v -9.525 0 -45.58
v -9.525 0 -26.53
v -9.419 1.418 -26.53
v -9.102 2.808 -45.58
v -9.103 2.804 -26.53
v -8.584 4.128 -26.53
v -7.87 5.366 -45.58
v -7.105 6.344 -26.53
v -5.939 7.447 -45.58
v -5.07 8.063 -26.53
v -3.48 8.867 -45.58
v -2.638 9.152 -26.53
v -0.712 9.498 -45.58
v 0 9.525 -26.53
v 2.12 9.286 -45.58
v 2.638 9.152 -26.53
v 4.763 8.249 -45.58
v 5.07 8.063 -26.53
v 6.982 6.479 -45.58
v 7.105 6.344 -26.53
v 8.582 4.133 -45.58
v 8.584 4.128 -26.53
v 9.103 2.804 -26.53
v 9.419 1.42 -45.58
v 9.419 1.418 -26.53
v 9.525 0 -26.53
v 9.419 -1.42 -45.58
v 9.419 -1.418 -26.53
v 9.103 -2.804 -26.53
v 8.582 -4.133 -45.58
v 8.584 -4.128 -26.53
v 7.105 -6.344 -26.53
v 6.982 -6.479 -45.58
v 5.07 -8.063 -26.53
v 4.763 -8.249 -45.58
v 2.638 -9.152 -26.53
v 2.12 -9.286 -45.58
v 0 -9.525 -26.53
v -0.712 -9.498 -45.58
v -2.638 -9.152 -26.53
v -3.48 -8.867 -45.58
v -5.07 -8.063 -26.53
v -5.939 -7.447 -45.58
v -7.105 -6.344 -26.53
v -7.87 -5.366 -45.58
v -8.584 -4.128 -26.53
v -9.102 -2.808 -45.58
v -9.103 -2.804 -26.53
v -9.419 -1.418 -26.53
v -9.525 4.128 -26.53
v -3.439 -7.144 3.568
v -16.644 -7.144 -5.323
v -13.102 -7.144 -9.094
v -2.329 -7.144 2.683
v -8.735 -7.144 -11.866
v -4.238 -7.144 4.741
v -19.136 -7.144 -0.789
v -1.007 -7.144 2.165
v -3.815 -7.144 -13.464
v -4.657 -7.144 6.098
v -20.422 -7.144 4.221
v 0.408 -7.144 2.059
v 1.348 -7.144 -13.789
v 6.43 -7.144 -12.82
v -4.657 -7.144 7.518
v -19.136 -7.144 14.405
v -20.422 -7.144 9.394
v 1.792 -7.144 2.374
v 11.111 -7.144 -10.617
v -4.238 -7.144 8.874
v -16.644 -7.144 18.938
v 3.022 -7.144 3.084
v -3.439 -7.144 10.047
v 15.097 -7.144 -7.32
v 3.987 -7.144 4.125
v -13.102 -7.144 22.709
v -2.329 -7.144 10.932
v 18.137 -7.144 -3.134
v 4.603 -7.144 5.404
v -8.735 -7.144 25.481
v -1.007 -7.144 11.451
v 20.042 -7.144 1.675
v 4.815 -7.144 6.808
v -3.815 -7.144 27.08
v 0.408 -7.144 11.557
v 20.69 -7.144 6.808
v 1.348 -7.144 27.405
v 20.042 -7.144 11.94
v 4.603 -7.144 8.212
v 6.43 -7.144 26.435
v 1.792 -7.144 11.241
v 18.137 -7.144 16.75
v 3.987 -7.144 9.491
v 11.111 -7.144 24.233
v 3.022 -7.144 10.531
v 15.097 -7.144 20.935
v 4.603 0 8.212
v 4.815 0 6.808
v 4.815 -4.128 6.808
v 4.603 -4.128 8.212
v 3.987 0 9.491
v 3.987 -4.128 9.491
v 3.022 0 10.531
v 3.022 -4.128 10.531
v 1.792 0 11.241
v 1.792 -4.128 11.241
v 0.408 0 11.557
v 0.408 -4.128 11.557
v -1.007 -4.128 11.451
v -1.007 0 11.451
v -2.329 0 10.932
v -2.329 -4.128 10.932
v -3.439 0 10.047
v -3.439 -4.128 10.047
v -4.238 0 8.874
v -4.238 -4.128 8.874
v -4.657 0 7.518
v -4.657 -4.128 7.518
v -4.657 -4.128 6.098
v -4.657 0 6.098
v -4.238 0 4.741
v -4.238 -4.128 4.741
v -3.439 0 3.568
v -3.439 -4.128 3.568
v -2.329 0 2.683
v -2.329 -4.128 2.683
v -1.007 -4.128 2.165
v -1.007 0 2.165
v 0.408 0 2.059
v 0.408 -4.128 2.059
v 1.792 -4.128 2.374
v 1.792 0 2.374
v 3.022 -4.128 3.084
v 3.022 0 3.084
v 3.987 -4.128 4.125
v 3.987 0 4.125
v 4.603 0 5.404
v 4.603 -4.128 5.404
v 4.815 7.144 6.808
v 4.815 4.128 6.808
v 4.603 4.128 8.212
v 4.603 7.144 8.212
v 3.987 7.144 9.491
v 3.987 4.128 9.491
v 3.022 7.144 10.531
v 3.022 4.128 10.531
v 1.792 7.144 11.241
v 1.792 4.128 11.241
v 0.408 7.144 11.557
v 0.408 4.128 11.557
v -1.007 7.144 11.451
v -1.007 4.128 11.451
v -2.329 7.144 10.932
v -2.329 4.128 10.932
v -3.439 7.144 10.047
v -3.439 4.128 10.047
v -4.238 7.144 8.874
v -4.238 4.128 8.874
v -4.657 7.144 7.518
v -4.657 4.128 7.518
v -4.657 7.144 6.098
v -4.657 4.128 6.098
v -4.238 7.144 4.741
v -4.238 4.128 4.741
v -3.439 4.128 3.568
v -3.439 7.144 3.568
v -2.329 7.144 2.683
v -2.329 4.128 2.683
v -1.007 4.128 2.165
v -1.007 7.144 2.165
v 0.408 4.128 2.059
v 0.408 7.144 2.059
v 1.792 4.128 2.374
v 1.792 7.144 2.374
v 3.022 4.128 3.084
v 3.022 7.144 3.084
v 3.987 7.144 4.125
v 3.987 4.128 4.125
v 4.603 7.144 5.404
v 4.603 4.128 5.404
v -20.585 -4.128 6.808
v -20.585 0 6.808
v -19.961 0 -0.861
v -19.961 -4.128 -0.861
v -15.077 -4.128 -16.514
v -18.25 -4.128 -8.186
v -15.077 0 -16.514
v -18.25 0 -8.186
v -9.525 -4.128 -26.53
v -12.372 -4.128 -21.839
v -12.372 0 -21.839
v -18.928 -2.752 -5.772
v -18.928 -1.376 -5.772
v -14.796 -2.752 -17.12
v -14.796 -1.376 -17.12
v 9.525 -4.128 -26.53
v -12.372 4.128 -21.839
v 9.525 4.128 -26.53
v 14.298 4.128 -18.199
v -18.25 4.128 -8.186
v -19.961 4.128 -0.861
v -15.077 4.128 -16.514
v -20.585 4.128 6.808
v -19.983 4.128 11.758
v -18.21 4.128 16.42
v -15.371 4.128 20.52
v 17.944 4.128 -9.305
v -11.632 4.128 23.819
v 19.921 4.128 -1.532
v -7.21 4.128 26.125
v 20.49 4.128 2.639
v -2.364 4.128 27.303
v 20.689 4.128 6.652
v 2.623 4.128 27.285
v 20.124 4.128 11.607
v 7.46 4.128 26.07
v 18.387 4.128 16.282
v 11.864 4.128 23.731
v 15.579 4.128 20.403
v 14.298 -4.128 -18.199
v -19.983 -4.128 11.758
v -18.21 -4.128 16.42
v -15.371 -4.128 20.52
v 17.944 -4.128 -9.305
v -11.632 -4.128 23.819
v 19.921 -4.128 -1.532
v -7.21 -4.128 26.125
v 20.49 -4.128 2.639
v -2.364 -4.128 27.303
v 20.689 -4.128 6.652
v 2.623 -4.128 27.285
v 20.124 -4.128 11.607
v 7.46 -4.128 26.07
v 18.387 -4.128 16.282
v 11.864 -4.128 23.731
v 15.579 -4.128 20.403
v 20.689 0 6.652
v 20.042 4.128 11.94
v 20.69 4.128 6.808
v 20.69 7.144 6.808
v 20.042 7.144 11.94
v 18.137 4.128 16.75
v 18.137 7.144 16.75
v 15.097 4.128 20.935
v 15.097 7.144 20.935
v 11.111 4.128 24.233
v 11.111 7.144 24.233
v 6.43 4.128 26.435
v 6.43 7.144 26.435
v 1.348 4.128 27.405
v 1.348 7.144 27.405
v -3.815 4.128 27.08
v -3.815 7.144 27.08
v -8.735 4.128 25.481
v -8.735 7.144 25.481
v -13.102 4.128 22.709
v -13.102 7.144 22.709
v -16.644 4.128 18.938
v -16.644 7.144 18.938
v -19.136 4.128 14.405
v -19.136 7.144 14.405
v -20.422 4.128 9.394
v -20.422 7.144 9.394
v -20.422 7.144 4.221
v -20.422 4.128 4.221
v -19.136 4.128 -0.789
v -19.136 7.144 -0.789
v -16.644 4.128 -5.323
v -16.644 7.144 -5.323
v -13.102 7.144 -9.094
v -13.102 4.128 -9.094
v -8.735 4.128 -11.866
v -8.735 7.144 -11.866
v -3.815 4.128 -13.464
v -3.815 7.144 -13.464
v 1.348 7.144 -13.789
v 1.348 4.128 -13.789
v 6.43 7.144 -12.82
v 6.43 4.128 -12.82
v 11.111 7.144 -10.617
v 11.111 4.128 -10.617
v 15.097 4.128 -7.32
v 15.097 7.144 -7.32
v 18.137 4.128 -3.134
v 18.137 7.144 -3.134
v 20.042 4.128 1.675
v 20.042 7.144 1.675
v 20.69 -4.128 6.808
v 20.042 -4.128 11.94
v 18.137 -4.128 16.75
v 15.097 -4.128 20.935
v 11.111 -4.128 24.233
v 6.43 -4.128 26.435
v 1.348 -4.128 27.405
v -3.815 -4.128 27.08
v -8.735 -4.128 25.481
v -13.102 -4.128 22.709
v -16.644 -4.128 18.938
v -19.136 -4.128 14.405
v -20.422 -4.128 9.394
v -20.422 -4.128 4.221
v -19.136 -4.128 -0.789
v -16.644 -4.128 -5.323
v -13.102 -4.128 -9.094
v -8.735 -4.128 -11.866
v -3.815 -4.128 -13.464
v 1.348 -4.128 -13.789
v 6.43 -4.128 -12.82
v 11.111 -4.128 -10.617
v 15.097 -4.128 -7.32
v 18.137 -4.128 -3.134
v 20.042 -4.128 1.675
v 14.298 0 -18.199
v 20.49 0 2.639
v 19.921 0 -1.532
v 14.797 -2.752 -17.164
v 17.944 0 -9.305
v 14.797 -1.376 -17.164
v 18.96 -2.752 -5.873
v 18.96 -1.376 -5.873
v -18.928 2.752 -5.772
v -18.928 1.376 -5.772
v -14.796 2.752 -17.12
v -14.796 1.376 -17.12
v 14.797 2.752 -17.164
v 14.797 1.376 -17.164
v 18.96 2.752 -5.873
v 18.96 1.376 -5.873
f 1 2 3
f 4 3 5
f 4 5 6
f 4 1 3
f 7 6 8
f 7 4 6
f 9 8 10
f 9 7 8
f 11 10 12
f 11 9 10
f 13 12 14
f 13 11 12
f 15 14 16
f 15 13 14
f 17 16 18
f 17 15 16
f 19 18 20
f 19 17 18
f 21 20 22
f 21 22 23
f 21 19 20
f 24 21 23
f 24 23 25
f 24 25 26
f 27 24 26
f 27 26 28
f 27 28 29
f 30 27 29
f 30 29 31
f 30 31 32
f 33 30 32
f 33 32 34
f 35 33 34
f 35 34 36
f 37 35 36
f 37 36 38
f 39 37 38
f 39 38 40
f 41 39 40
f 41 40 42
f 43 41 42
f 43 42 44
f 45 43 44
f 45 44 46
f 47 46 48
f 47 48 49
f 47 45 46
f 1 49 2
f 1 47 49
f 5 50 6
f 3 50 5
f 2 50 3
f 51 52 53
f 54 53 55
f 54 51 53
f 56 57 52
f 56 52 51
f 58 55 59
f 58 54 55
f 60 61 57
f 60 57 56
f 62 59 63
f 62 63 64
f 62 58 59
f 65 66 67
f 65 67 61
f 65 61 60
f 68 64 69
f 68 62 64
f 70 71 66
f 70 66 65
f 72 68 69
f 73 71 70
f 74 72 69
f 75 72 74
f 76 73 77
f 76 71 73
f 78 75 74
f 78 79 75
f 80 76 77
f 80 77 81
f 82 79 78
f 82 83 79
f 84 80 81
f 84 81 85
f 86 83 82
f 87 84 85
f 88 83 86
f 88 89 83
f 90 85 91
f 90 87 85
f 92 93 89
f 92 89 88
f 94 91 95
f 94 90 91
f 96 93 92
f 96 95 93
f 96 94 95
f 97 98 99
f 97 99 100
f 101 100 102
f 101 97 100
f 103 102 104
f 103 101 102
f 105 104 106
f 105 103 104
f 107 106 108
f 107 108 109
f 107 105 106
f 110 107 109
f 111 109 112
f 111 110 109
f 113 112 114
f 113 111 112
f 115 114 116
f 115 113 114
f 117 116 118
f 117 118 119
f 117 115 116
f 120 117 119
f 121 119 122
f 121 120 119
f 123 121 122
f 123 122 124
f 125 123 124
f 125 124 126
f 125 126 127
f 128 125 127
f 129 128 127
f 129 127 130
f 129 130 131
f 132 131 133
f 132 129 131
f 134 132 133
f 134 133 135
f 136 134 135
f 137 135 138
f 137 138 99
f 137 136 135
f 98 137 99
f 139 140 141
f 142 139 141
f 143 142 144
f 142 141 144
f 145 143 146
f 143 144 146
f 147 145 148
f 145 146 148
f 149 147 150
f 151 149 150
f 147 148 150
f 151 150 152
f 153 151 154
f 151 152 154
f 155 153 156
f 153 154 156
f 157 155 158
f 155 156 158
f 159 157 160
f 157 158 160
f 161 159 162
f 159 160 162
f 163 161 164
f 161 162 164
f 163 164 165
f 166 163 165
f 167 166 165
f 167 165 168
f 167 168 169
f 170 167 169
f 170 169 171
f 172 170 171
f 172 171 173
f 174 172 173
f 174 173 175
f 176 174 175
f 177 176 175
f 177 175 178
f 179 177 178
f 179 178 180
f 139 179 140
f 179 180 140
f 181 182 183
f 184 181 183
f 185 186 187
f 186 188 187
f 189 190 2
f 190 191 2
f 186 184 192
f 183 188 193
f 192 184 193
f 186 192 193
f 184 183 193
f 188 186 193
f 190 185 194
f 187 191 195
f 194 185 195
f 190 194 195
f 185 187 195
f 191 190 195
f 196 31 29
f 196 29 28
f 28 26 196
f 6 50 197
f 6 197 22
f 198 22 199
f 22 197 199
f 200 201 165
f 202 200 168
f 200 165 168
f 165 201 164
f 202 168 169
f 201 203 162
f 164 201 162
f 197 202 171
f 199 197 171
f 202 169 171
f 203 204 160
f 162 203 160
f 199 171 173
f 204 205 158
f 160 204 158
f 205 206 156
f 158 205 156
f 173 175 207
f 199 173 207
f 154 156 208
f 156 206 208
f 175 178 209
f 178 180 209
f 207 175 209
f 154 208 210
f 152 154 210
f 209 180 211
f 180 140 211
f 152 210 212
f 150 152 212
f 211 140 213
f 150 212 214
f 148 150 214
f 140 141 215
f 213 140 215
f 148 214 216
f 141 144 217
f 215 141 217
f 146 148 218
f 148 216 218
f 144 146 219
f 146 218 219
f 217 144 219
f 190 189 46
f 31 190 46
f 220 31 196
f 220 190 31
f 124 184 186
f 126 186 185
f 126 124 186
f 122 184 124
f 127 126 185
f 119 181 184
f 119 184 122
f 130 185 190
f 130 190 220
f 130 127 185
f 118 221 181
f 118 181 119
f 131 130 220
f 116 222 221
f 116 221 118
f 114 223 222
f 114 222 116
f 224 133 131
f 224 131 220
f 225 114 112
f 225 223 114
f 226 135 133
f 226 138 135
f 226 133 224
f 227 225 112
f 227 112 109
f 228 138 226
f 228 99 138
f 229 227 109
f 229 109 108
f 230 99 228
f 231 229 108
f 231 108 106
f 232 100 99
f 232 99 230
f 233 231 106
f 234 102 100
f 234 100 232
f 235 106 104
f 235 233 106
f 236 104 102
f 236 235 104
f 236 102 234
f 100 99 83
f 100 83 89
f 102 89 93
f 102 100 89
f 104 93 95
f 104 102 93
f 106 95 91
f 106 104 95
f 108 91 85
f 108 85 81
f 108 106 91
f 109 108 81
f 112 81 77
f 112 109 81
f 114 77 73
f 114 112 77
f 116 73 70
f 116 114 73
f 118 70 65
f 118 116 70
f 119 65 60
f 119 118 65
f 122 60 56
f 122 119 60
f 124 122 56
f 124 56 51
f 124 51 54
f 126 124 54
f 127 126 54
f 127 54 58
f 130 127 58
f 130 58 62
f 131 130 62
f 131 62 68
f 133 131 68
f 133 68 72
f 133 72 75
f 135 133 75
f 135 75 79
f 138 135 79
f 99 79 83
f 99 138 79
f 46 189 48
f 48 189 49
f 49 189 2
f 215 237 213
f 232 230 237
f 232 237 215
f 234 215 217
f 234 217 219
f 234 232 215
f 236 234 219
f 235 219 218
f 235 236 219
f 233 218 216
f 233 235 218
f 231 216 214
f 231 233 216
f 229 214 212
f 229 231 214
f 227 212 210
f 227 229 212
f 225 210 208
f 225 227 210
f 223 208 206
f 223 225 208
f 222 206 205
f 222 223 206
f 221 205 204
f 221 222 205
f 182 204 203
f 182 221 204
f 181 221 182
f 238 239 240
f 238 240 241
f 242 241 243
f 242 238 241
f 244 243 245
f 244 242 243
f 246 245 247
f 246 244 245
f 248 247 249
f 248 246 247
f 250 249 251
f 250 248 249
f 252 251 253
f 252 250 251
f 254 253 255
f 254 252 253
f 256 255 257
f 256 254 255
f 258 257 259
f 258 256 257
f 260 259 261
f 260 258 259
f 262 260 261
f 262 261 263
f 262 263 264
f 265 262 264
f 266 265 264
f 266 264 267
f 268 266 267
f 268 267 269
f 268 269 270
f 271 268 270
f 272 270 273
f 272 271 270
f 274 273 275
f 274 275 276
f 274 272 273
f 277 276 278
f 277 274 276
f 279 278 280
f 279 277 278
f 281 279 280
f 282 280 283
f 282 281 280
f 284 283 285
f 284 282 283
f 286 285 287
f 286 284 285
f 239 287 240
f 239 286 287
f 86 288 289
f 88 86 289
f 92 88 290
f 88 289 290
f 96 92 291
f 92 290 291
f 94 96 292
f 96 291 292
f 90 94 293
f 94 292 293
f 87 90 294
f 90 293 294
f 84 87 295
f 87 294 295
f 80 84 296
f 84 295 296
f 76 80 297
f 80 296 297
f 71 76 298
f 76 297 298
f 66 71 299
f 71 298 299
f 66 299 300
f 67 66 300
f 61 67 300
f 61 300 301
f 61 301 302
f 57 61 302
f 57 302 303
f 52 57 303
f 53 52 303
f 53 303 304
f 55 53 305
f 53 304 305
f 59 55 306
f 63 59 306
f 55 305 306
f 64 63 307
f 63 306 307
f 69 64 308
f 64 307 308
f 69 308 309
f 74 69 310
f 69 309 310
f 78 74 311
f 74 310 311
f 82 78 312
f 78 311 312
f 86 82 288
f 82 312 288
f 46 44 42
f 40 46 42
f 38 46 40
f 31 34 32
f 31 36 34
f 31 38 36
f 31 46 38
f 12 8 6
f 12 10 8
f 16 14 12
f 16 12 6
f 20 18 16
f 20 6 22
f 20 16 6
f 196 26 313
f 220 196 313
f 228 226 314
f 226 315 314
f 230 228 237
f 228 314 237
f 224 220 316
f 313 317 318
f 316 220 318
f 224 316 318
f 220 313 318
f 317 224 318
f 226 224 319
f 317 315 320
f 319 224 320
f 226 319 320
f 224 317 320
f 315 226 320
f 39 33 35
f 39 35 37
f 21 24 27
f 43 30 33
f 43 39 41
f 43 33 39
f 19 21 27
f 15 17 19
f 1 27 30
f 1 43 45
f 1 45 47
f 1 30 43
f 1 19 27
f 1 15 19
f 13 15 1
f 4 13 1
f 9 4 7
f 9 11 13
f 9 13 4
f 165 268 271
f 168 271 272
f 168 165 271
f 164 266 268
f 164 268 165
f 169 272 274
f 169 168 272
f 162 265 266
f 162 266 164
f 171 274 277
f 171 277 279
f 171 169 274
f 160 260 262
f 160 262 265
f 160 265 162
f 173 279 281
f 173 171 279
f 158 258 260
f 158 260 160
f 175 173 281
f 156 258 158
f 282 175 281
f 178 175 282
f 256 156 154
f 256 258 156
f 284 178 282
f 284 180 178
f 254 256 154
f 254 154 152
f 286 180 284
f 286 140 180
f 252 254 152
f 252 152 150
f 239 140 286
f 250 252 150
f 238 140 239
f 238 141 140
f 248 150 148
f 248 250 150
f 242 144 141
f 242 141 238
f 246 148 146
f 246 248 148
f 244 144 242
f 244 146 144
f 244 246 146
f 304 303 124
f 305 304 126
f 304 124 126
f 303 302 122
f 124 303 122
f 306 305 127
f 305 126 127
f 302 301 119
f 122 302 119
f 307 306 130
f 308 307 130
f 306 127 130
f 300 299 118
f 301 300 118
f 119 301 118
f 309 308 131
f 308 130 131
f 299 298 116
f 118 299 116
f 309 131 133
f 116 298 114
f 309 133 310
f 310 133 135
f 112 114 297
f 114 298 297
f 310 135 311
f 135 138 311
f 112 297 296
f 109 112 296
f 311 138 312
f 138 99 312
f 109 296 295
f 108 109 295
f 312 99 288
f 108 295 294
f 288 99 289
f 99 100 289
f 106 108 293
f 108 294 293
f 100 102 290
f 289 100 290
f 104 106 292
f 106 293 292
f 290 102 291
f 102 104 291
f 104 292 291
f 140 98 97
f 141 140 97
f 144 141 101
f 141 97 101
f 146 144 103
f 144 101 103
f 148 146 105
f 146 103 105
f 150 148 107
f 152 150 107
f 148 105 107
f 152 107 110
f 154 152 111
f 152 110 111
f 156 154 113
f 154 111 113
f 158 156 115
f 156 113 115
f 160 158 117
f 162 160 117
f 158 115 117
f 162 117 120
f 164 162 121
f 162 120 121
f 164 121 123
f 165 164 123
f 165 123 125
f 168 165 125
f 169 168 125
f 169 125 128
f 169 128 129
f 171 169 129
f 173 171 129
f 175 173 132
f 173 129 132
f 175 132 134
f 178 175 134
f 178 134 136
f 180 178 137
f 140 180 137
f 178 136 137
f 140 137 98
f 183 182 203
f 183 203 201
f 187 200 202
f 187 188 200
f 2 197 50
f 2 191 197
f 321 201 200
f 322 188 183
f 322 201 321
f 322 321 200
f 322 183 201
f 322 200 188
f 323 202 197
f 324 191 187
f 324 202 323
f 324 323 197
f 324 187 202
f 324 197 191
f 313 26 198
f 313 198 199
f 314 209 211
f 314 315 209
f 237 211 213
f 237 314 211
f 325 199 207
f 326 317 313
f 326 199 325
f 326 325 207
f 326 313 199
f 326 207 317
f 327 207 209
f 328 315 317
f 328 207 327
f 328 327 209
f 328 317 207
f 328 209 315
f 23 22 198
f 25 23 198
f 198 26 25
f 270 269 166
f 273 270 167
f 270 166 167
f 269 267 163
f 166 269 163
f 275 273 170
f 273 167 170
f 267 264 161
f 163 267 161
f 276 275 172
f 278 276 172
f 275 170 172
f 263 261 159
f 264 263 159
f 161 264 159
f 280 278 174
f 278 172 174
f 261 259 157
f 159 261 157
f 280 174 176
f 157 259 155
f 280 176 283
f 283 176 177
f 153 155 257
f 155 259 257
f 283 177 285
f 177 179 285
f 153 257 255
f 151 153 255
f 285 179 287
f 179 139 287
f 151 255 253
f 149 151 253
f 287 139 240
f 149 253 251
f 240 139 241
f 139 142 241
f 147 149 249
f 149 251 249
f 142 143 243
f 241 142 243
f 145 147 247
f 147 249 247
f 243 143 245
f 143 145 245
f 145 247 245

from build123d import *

# Parameters (mm, degrees)
F0_R          = 4.7625
F2_DEPTH      = 4.1275
F2_DEPTH_BACK = 4.1275
F3_START      = 4.1275
F3_DEPTH      = 3.01625


with BuildPart() as f1:
    # F0 (on Front) → F1 (revolve)
    with BuildSketch(Plane.XZ):
        with BuildLine():
            add(Edge.make_bspline(
                [(-9.525, -26.529728329), (-6.2775706923, -31.468818827), (-3.1374456756, -34.9706735986), (0, -34.9699468051)],
                knots=[0.3120763543, 0.3120763543, 0.3120763543, 0.3120763543, 0.4999263386, 0.4999263386, 0.4999263386, 0.4999263386], degree=3))
            Line((-9.525, -26.529728329), (-9.525, -45.579728329))
            Line((-9.525, -45.579728329), (0, -45.579728329))
            Line((0, -45.579728329), (0, -34.9699468051))
        make_face()
        with BuildLine():
            Line((0, -26.529728329), (-9.525, -26.529728329))
            add(Edge.make_bspline(
                [(-9.525, -26.529728329), (-6.2775706923, -31.468818827), (-3.1374456756, -34.9706735986), (0, -34.9699468051)],
                knots=[0.3120763543, 0.3120763543, 0.3120763543, 0.3120763543, 0.4999263386, 0.4999263386, 0.4999263386, 0.4999263386], degree=3))
            Line((0, -34.9699468051), (0, -26.529728329))
        make_face()
    revolve(axis=Axis((0, 0, -36.054728329), (0, 0, -1)))

    # F0 (on Front) → F2 (join, two sides)
    with BuildSketch(Plane.XZ) as f2_sk:
        with BuildLine():
            ThreePointArc((-20.5850532055, 6.807771671), (0.0524467945, -13.829728329), (20.6899467945, 6.807771671))
            ThreePointArc((20.6899467945, 6.807771671), (0.0524467945, 27.445271671), (-20.5850532055, 6.807771671))
        make_face()
        with Locations((0.0524467945, 6.807771671)):
            Circle(F0_R, mode=Mode.SUBTRACT)
        with BuildLine():
            add(Edge.make_bspline(
                [(9.525, -26.529728329), (14.931428061, -18.3253448521), (20.6638962408, -6.1625799815), (20.6899467945, 6.807771671)],
                knots=[0.687776323, 0.687776323, 0.687776323, 0.687776323, 1, 1, 1, 1], degree=3))
            ThreePointArc((20.6899467945, 6.807771671), (0.0524467945, -13.829728329), (-20.5850532055, 6.807771671))
            add(Edge.make_bspline(
                [(-20.5850532055, 6.807771671), (-20.6111024945, -6.1523622547), (-14.9199746264, -18.3243863833), (-9.525, -26.529728329)],
                knots=[0, 0, 0, 0, 0.3120763543, 0.3120763543, 0.3120763543, 0.3120763543], degree=3))
            Line((-9.525, -26.529728329), (0, -26.529728329))
            Line((0, -26.529728329), (9.525, -26.529728329))
        make_face()
    extrude(amount=F2_DEPTH)
    extrude(f2_sk.sketch, amount=-F2_DEPTH_BACK)


with BuildPart() as f3:
    # F0 (on Front) → F3 (new body)
    with BuildSketch(Plane.XZ.offset(F3_START)):
        with BuildLine():
            ThreePointArc((-20.5850532055, 6.807771671), (0.0524467945, -13.829728329), (20.6899467945, 6.807771671))
            ThreePointArc((20.6899467945, 6.807771671), (0.0524467945, 27.445271671), (-20.5850532055, 6.807771671))
        make_face()
        with Locations((0.0524467945, 6.807771671)):
            Circle(F0_R, mode=Mode.SUBTRACT)
    extrude(amount=F3_DEPTH)


with BuildPart() as f4_1:
    # F4: instance of F3
    add(f3.part.mirror(Plane.XZ))


solid = Compound([f1.part, f3.part, f4_1.part])
